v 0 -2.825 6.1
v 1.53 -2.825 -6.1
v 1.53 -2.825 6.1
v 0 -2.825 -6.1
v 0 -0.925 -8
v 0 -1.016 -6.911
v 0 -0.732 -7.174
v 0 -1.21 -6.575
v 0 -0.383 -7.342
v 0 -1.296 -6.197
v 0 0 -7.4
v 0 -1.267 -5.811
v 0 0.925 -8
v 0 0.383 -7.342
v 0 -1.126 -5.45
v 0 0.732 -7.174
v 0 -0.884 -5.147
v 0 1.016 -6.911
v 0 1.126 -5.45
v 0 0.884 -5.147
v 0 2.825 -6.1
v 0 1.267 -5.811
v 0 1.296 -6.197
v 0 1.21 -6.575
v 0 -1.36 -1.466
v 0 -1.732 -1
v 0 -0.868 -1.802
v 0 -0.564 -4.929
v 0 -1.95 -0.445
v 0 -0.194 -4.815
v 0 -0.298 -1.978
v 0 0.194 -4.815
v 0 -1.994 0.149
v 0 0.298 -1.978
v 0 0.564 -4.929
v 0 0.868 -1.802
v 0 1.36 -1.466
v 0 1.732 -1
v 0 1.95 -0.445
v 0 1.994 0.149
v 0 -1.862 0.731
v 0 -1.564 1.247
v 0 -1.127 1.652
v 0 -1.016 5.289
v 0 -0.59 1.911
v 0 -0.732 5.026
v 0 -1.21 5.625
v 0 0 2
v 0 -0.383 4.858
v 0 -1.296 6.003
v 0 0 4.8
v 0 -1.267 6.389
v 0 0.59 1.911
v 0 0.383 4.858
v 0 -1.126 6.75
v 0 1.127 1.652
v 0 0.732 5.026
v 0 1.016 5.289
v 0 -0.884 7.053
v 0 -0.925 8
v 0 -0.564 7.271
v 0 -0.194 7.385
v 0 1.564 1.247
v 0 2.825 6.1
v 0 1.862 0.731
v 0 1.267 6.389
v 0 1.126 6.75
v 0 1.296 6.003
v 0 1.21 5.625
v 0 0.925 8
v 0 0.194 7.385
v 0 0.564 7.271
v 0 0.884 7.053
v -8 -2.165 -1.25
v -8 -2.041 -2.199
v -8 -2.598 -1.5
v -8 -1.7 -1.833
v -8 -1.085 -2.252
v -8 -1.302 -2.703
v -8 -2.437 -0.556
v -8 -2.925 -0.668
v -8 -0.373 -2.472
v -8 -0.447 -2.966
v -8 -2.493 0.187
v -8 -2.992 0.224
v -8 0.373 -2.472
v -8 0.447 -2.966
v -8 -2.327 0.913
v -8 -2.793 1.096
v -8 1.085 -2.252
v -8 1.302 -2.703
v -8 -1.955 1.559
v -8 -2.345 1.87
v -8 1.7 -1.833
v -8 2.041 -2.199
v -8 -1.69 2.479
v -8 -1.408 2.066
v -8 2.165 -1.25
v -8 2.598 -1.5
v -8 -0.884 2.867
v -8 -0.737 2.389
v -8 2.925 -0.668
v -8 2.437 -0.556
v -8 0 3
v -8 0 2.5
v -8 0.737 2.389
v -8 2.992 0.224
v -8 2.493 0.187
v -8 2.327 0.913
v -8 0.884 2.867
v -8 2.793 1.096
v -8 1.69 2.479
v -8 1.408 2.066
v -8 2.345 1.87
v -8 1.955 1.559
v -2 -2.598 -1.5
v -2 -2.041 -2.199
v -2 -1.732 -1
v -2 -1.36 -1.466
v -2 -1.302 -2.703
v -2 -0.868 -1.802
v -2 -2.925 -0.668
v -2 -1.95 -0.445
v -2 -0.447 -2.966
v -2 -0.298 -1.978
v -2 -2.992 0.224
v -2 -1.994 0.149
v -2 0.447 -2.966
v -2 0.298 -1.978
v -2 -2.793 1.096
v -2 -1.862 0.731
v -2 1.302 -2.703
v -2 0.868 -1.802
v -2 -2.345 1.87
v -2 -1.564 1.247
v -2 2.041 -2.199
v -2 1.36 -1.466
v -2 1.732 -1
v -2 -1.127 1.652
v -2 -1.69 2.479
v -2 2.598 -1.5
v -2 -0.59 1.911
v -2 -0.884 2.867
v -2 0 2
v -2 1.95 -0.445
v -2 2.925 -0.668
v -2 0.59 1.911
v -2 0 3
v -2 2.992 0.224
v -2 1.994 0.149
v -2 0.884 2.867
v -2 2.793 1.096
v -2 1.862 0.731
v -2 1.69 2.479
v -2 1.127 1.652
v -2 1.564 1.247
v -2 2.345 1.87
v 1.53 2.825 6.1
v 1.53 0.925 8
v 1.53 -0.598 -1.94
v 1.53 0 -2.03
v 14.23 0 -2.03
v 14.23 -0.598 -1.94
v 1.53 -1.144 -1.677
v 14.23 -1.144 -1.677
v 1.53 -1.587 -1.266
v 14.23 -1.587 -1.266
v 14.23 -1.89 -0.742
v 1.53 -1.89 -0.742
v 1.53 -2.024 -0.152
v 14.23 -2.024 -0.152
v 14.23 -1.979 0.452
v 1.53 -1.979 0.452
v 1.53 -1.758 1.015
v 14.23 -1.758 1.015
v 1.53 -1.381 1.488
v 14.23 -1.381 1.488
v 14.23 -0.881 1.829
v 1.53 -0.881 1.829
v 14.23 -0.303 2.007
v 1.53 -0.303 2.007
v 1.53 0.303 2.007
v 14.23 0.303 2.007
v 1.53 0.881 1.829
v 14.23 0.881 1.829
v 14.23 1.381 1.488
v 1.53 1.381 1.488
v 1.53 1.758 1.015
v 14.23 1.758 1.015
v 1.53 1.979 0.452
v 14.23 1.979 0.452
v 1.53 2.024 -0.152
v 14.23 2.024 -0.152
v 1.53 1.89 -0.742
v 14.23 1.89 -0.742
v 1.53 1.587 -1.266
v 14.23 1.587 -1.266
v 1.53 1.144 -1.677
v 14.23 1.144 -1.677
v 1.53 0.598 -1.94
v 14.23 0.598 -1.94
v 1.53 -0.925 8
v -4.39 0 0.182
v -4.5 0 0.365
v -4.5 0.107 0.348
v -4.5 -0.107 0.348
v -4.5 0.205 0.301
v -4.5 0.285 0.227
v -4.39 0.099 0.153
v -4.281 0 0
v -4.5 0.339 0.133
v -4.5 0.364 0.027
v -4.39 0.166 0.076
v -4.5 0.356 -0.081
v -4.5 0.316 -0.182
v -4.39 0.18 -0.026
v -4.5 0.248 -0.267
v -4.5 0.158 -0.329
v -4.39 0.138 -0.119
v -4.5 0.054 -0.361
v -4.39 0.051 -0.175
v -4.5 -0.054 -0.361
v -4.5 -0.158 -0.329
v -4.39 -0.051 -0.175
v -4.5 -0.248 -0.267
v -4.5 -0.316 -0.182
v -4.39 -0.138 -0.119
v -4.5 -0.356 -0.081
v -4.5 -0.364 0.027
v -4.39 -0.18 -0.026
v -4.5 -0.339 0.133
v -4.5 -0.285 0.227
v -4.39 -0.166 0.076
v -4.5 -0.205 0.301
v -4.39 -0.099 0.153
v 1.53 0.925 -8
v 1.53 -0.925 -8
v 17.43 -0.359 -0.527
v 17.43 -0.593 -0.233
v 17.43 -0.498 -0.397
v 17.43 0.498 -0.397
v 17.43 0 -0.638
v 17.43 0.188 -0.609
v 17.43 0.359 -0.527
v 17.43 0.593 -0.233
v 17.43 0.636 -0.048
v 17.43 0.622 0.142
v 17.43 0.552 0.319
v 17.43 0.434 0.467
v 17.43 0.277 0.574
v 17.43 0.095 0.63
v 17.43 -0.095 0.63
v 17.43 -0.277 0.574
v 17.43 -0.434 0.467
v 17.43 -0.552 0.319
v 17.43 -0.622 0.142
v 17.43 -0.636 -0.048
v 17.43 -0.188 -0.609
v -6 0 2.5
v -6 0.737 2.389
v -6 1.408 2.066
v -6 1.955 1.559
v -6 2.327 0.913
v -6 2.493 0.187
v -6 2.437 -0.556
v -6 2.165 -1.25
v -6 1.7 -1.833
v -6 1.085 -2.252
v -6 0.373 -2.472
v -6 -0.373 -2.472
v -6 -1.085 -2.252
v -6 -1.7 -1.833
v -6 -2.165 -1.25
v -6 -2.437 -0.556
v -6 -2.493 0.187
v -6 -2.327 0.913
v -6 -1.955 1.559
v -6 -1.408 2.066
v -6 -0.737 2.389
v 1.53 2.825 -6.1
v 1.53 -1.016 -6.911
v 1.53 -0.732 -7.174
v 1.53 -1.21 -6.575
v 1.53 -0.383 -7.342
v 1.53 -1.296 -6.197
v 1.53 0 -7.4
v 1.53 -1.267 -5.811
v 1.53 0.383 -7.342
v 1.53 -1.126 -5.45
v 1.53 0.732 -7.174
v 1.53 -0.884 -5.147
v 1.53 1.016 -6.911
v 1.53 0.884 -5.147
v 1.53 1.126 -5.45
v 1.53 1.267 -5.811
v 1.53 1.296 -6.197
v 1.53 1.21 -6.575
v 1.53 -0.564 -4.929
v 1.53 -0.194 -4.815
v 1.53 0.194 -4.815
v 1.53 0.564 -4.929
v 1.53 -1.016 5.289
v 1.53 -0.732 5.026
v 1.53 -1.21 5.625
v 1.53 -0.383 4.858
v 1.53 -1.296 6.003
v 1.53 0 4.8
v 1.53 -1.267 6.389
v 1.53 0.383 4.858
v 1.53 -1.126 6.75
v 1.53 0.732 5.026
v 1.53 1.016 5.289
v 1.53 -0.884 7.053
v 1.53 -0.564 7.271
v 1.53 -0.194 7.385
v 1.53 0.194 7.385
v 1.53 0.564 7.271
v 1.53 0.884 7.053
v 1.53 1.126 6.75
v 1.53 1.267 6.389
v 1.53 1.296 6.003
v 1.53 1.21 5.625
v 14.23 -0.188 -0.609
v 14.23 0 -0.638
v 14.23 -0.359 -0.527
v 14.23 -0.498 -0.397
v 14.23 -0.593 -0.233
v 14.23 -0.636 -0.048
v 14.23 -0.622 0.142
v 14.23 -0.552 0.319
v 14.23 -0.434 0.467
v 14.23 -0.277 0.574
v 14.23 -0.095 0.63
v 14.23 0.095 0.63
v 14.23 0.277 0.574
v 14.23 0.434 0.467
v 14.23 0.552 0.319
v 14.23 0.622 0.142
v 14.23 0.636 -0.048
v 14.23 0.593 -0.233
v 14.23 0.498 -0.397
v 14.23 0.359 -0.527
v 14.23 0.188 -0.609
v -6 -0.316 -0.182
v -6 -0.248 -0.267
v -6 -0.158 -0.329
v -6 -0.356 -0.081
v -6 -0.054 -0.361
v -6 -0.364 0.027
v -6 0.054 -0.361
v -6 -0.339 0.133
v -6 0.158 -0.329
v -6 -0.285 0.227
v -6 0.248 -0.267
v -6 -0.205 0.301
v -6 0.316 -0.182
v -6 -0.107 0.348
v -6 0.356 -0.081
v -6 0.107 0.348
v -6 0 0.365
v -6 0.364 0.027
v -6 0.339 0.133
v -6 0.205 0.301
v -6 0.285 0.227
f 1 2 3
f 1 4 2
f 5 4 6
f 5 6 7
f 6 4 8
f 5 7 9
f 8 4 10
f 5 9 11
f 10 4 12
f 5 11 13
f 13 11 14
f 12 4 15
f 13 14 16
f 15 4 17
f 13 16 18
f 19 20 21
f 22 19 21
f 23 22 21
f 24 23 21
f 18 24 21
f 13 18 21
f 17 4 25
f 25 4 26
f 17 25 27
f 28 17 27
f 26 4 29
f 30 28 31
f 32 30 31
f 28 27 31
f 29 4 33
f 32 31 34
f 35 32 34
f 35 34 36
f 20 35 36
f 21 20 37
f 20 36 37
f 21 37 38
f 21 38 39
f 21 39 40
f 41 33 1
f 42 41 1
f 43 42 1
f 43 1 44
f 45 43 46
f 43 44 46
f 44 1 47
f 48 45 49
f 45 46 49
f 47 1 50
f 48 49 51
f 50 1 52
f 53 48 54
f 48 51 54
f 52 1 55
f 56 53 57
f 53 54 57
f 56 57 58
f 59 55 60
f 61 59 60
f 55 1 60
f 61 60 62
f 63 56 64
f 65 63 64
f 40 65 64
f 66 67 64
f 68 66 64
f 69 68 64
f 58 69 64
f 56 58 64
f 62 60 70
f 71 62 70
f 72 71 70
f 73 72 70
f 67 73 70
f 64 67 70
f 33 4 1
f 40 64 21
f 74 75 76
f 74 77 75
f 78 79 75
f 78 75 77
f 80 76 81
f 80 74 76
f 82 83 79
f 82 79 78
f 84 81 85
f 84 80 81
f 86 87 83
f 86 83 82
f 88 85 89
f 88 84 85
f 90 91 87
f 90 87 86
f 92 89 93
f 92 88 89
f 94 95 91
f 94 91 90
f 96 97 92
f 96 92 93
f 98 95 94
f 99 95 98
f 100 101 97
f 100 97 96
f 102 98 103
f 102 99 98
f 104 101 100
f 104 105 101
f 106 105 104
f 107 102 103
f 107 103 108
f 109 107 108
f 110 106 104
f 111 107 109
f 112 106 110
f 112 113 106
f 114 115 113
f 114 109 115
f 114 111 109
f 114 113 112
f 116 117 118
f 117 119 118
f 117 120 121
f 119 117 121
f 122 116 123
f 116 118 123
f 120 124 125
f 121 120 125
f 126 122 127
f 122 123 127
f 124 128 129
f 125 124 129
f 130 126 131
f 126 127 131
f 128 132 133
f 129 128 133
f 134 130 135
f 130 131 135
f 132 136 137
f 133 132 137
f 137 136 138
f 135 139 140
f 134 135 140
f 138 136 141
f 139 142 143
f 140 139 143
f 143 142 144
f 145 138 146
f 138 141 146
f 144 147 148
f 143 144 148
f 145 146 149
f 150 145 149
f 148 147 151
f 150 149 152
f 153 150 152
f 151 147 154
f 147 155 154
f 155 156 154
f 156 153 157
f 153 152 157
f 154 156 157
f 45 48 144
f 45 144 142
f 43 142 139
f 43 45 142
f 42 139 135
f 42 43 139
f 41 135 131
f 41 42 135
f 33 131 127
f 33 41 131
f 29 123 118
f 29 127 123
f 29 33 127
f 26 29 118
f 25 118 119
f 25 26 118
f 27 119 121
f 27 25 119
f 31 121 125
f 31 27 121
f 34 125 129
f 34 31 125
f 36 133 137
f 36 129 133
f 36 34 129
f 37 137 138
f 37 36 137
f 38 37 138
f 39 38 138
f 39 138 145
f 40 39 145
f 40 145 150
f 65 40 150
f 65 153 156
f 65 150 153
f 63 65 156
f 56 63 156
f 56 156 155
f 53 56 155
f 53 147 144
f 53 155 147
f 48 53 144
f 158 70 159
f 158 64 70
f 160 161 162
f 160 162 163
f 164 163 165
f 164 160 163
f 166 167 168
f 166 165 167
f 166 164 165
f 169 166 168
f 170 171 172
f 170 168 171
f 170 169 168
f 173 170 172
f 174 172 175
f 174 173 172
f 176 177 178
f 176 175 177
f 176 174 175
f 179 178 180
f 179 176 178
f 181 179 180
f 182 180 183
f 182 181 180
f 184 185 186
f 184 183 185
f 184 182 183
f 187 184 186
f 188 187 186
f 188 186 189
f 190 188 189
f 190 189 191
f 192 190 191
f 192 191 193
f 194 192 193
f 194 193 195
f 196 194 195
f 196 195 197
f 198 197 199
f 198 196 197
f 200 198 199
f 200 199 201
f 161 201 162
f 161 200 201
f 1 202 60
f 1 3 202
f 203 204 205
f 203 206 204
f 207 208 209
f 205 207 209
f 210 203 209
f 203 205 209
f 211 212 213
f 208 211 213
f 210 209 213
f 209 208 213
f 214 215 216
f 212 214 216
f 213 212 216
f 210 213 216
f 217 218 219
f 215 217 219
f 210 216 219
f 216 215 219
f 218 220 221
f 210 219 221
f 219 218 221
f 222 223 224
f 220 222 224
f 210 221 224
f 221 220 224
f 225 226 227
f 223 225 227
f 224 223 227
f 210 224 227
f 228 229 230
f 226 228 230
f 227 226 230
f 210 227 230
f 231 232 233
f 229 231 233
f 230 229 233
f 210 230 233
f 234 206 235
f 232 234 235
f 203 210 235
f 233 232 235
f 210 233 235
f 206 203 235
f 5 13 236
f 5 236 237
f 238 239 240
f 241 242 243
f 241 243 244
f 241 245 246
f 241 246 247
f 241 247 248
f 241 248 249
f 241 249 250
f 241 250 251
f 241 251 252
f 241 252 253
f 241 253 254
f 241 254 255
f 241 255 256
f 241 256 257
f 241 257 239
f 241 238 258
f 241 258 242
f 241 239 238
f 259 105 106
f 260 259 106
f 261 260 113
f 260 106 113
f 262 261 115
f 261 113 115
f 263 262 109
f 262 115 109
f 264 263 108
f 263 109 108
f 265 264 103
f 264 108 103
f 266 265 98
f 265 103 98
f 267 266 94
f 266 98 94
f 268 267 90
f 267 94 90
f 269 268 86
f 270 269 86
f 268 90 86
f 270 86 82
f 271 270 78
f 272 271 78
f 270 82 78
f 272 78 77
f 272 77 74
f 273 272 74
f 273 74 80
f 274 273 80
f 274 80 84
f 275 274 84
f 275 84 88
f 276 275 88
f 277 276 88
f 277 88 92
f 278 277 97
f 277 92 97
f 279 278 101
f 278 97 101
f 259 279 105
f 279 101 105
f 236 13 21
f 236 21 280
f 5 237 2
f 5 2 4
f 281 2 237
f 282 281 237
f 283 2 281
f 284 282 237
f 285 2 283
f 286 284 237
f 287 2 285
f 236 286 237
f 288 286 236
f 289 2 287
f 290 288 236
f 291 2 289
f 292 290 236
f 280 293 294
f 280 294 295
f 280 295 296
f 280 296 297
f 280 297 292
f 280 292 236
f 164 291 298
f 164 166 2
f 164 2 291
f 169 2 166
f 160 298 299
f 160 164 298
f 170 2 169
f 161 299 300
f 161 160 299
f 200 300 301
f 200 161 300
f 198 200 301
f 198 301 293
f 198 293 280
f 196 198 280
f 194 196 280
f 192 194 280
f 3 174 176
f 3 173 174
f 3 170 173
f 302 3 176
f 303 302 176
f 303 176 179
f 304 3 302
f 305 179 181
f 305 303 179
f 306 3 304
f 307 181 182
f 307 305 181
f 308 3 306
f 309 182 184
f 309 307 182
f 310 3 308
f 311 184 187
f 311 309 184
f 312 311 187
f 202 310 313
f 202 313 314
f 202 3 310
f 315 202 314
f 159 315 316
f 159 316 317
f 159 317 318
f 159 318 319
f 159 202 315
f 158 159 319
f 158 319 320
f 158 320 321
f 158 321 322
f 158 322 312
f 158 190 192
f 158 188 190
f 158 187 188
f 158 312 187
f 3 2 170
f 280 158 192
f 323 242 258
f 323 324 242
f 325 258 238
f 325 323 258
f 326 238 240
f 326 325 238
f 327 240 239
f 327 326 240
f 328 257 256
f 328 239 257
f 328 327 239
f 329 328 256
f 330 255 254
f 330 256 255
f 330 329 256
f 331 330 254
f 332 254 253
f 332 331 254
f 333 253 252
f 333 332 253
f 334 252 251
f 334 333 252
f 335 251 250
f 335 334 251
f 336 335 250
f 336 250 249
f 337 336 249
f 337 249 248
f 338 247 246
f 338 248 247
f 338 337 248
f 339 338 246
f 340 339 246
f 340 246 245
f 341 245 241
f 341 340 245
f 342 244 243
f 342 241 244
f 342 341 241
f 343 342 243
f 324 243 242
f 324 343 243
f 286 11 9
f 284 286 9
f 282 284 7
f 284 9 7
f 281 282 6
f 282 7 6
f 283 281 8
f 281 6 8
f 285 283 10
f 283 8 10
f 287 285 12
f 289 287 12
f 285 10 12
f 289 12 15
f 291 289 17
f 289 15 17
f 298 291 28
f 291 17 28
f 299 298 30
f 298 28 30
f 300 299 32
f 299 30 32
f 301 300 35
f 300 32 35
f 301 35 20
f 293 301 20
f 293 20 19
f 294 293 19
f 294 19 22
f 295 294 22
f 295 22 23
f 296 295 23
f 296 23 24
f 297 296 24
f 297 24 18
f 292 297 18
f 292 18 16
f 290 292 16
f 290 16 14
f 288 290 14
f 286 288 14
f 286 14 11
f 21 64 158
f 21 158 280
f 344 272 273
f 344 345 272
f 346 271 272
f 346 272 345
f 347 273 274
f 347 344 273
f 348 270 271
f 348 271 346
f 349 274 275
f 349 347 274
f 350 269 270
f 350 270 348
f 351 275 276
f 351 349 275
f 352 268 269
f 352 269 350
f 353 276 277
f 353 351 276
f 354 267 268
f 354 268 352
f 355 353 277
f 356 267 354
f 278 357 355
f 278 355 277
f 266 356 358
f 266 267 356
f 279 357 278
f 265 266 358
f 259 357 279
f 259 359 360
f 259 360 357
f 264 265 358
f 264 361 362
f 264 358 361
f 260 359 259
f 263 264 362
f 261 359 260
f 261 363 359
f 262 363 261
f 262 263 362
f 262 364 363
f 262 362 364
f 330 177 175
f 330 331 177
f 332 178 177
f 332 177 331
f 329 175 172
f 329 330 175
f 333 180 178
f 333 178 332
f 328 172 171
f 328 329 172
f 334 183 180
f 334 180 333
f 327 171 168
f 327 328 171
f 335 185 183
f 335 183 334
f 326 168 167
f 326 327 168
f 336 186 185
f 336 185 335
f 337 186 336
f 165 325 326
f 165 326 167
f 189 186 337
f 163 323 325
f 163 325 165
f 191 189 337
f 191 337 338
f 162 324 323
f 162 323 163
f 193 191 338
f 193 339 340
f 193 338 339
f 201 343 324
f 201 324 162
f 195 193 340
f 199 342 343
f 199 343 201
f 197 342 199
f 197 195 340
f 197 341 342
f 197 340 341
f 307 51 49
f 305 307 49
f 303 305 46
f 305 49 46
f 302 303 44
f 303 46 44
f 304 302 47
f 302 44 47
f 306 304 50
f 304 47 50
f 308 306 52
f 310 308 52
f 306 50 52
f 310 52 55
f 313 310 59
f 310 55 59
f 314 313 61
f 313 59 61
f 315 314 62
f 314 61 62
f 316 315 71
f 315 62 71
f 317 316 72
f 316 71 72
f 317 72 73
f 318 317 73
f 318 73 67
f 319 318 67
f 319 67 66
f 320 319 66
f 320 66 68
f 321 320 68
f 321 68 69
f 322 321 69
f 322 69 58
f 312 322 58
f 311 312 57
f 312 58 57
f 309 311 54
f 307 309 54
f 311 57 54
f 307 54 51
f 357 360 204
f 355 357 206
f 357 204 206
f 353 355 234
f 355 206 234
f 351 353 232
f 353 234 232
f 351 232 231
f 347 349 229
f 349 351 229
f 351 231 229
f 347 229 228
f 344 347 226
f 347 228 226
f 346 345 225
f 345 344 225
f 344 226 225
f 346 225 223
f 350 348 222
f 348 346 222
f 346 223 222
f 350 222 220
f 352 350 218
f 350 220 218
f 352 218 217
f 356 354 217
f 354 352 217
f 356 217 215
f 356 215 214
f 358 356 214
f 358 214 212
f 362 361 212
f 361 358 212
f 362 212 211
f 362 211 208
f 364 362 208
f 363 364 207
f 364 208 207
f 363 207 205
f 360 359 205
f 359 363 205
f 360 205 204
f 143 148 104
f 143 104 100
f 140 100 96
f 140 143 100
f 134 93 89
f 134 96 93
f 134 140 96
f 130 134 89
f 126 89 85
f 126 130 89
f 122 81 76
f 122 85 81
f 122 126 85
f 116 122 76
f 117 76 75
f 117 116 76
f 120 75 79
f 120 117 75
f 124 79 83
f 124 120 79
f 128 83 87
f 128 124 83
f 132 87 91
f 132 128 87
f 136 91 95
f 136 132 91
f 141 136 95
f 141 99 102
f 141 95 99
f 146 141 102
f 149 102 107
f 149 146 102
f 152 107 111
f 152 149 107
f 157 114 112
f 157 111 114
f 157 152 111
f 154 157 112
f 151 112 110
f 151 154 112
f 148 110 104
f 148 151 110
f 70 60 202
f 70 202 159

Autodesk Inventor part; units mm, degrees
ref_plane "YZ Plane" through (0, 0, 0) normal (1, 0, 0) x (0, 1, 0)
ref_plane "XZ Plane" through (0, 0, 0) normal (0, 1, 0) x (-1, 0, 0)
ref_plane "XY Plane" through (0, 0, 0) normal (0, 0, 1) x (1, 0, 0)
sketch "Sketch1" plane through (0, 0, 0) normal (1, 0, 0) x (0, 1, 0)
  line L0 (-2.825, 8) -> (2.825, 8)
  line L1 (2.825, 8) -> (2.825, -8)
  line L2 (2.825, -8) -> (-2.825, -8)
  line L3 (-2.825, -8) -> (-2.825, 8)
  line L4 (-2.825, 8) -> (2.825, -8) construction
  line L5 (2.825, 8) -> (-2.825, -8) construction
  point P0 (0, 0)
  dimension "d0" = 5.65
  dimension "d1" = 16
extrude "Extrusion1" add sketch "Sketch1" along normal blind 1.53
sketch "Sketch2" plane through (1.53, 0, 0) normal (1, 0, 0) x (0, 0, -1)
  line L0 (8, 2.825) -> (-8, 2.825) projected
  line L1 (-6.1, -2.825) -> (6.1, -2.825)
  line L2 (6.1, -2.825) -> (6.1, 2.825) construction
  line L3 (6.1, 2.825) -> (-6.1, 2.825)
  line L4 (-6.1, 2.825) -> (-6.1, -2.825) construction
  line L5 (-6.1, -2.825) -> (6.1, 2.825) construction
  line L6 (6.1, -2.825) -> (-6.1, 2.825) construction
  point P0 (0, 0)
  point P1 (6.1, 0)
  point P2 (-6.1, 0)
  dimension "d4" = 12.2
hole "Hole1" at (1.53, 0, -6.1) at (1.53, 0, 6.1) direction (-1, 0, 0) diameter 2.6 end through all
chamfer "Chamfer1" distance 1.9 angle 45 4 edges at (0.765, 2.825, 8) (0.765, 2.825, -8) (0.765, -2.825, 8) (0.765, -2.825, -8)
sketch "Sketch3" plane through (1.53, 0, 0) normal (1, 0, 0) x (0, 0, -1)
  circle A0 centre (0, 0) radius 2.03
  dimension "d15" = 4.06
extrude "Extrusion2" add sketch "Sketch3" along normal blind 12.7
sketch "Sketch4" plane through (14.23, 0, 0) normal (1, 0, 0) x (0, 0, -1)
  circle A0 centre (0, 0) radius 0.6375
  dimension "d18" = 1.275
extrude "Extrusion3" add sketch "Sketch4" along normal blind 3.2
sketch "Sketch5" plane through (0, 0, 0) normal (-1, 0, 0) x (0, 0, 1)
  circle A0 centre (0, 0) radius 2
  dimension "d21" = 4
extrude "Extrusion4" add sketch "Sketch5" along normal blind 2
sketch "Sketch6" plane through (-2, 0, 0) normal (-1, 0, 0) x (0, 0, 1)
  circle A0 centre (0, 0) radius 3
  dimension "d24" = 6
extrude "Extrusion5" add sketch "Sketch6" along normal blind 6
thread "Thread1" size "M6x1" class "6g" standard "ANSI Metric M Profile" full length
sketch "Sketch7" plane through (-8, 0, 0) normal (-1, 0, 0) x (0, 0, 1)
  circle A0 centre (0, 0) radius 0.6375 projected
hole "Hole2" at (-8, 0, 0) direction (1, 0, 0) diameter 0.7294 depth 3.5 tip angle 118 thread size "M1x0.25" class "6H" standard "ANSI Metric M Profile"
sketch "Sketch8" plane through (-8, 0, 0) normal (-1, 0, 0) x (0, 0, 1)
  circle A0 centre (0, 0) radius 0.3647 projected
  circle A1 centre (0, 0) radius 2.5
  dimension "d36" = 5
extrude "Extrusion6" cut sketch "Sketch8" against normal blind 2
properties part number "SMAPanel1" material "Brass, Soft Yellow"
